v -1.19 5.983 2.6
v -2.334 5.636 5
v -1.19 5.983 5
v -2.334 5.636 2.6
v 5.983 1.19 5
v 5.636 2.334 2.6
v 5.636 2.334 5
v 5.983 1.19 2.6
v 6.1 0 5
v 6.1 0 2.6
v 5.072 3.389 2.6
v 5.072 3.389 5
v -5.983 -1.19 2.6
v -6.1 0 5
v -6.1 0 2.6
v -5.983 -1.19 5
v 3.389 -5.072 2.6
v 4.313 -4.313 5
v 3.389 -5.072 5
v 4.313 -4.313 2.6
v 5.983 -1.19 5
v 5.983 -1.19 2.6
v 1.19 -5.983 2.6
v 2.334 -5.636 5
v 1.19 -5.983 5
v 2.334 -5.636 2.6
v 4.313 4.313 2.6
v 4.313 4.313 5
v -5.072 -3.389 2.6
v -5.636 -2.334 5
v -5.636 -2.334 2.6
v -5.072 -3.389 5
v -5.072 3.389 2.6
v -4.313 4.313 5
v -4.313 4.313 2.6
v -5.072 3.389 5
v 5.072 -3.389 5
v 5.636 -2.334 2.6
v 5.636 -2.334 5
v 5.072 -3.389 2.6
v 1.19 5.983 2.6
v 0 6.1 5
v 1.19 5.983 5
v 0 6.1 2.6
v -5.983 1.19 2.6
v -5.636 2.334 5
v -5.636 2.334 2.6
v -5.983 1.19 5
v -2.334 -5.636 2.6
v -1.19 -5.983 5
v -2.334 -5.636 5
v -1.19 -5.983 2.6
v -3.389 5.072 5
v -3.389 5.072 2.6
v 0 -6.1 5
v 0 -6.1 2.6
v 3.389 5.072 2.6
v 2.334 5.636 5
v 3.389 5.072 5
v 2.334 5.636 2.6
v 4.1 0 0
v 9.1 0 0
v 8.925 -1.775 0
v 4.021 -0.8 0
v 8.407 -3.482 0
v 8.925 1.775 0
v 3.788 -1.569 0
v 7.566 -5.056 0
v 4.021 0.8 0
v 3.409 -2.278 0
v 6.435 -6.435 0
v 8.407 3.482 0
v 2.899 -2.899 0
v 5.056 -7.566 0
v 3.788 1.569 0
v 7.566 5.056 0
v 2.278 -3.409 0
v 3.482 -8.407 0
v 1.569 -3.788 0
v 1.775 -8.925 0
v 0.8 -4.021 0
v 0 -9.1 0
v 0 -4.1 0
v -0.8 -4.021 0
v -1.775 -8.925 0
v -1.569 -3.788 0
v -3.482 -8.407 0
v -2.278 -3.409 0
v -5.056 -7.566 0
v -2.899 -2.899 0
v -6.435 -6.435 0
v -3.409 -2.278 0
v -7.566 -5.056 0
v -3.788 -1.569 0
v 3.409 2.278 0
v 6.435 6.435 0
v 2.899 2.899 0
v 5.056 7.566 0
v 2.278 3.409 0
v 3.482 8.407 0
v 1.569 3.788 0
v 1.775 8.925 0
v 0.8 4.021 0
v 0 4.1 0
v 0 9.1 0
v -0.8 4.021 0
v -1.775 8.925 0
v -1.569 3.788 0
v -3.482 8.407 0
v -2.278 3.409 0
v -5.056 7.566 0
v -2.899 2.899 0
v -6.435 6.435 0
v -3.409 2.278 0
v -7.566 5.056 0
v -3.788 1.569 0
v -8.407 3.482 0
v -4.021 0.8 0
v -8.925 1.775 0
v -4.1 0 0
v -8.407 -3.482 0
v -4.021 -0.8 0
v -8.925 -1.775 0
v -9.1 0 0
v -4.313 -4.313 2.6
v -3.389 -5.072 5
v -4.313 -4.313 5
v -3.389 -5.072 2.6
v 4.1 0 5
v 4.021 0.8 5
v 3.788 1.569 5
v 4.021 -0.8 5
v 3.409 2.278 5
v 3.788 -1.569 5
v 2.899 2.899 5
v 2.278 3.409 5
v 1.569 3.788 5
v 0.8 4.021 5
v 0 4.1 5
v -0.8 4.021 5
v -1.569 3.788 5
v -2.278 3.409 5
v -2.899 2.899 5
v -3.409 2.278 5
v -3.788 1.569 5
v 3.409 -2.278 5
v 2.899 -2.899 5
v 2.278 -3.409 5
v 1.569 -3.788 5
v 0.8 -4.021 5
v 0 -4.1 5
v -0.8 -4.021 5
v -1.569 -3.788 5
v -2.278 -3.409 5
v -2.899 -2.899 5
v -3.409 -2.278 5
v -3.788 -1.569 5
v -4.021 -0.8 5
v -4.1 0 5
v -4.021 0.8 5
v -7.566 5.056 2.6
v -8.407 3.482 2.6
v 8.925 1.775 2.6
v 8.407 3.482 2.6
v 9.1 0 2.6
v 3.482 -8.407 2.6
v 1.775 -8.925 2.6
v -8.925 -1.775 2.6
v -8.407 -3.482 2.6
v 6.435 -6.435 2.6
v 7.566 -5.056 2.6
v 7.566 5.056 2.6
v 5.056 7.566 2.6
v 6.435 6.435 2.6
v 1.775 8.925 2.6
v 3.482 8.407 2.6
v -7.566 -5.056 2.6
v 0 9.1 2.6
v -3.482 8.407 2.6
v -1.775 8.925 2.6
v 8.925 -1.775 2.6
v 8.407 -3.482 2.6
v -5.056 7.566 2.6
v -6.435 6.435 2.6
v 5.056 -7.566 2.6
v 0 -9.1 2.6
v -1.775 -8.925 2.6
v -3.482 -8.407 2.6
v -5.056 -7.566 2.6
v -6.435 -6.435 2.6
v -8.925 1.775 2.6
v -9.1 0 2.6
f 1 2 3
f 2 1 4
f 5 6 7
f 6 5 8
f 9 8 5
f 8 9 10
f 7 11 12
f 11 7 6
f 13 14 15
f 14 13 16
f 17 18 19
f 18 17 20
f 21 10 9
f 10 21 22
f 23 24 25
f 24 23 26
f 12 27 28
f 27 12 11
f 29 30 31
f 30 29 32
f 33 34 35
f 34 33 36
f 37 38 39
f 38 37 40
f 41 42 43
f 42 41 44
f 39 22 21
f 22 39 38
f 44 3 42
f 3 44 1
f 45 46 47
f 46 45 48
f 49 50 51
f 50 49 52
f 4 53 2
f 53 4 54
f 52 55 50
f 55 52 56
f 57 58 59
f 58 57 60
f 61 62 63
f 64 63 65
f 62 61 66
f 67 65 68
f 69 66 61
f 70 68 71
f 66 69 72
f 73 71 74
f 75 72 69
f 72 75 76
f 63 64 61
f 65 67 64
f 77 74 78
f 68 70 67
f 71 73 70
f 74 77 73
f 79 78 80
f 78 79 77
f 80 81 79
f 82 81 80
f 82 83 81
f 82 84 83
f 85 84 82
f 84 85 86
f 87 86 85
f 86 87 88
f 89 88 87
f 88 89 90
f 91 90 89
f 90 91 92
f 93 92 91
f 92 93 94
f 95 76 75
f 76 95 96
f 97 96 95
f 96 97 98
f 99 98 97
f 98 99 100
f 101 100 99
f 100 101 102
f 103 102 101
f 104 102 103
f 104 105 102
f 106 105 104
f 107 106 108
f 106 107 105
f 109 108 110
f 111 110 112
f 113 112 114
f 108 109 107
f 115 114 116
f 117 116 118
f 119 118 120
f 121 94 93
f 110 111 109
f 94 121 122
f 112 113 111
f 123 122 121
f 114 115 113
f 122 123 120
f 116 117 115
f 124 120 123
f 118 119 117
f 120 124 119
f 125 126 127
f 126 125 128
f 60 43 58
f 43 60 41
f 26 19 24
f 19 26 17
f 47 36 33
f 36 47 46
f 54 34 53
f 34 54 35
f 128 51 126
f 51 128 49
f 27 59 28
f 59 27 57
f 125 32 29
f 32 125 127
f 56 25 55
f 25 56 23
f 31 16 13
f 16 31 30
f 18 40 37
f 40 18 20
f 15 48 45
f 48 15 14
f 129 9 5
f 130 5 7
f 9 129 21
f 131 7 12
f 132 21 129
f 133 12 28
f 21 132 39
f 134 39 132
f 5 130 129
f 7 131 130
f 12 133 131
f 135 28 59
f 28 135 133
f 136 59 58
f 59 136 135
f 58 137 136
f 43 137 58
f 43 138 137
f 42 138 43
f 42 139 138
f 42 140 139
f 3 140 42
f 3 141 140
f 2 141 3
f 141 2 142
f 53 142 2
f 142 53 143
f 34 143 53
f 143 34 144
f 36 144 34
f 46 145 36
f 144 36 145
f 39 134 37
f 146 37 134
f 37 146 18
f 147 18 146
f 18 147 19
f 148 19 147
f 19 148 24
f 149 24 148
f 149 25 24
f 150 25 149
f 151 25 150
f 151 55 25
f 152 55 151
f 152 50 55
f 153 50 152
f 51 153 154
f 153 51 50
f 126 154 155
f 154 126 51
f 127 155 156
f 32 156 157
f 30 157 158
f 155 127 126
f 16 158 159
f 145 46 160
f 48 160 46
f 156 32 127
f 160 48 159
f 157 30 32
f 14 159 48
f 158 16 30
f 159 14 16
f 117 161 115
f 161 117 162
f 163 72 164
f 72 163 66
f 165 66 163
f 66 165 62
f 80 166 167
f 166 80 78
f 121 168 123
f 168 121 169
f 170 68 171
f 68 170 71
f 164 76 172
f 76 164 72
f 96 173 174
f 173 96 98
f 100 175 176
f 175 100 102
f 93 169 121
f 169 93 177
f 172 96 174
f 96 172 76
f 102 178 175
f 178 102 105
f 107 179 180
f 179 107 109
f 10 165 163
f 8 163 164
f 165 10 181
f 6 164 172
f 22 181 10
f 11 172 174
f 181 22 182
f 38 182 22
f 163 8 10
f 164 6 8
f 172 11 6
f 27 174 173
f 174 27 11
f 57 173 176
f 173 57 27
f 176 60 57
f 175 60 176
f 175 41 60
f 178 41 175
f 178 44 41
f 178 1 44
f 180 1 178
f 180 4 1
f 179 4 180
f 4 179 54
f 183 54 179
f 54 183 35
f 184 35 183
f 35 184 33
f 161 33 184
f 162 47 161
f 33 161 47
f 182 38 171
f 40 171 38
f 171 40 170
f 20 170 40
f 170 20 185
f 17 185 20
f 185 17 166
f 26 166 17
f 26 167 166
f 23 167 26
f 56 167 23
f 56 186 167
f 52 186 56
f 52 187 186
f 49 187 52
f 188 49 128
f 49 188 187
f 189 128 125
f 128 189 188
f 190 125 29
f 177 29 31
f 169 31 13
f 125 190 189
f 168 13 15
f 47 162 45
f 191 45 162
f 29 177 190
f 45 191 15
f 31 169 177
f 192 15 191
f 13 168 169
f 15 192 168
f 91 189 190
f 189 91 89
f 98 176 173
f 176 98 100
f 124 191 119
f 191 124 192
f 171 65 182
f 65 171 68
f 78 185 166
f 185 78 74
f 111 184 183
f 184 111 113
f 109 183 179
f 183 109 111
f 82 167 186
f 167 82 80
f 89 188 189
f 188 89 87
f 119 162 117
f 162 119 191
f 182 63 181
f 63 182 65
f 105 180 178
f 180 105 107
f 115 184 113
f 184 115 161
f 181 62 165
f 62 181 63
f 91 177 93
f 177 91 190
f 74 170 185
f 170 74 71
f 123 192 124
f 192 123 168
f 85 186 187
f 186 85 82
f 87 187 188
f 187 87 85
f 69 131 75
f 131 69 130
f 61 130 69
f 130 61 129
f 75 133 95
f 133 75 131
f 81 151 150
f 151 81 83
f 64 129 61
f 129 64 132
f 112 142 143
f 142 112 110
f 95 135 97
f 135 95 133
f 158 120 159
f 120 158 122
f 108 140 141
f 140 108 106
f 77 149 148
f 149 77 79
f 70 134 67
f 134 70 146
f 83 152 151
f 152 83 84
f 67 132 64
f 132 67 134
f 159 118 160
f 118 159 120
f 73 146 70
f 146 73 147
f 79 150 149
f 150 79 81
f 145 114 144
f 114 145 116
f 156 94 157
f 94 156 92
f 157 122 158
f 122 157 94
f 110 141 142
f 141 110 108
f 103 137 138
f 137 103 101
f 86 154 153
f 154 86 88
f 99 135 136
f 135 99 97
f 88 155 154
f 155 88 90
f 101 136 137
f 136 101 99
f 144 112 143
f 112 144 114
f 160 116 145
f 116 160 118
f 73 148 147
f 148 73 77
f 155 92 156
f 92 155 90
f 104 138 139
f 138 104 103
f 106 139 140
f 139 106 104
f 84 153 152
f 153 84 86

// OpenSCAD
$fn = 32;

// ----------------------------------------------------------------------
// Spacer sleeve: 12.2 / 8.2 x 5 mm
// ----------------------------------------------------------------------

// --- parameters (mm) ---
outer_d = 12.2;           // outside diameter
inner_d = 8.2;            // shaft bore
length = 5;               // sleeve length
flange_d = 18.2;          // collar diameter
flange_t = 2;             // collar thickness

module sleeve() {
  cylinder(h = length, d = outer_d);
  cylinder(h = flange_t + 0.6, d = flange_d);
}

difference() {
  sleeve();
  translate([0, 0, -1]) cylinder(h = length + 2, d = inner_d);
}
